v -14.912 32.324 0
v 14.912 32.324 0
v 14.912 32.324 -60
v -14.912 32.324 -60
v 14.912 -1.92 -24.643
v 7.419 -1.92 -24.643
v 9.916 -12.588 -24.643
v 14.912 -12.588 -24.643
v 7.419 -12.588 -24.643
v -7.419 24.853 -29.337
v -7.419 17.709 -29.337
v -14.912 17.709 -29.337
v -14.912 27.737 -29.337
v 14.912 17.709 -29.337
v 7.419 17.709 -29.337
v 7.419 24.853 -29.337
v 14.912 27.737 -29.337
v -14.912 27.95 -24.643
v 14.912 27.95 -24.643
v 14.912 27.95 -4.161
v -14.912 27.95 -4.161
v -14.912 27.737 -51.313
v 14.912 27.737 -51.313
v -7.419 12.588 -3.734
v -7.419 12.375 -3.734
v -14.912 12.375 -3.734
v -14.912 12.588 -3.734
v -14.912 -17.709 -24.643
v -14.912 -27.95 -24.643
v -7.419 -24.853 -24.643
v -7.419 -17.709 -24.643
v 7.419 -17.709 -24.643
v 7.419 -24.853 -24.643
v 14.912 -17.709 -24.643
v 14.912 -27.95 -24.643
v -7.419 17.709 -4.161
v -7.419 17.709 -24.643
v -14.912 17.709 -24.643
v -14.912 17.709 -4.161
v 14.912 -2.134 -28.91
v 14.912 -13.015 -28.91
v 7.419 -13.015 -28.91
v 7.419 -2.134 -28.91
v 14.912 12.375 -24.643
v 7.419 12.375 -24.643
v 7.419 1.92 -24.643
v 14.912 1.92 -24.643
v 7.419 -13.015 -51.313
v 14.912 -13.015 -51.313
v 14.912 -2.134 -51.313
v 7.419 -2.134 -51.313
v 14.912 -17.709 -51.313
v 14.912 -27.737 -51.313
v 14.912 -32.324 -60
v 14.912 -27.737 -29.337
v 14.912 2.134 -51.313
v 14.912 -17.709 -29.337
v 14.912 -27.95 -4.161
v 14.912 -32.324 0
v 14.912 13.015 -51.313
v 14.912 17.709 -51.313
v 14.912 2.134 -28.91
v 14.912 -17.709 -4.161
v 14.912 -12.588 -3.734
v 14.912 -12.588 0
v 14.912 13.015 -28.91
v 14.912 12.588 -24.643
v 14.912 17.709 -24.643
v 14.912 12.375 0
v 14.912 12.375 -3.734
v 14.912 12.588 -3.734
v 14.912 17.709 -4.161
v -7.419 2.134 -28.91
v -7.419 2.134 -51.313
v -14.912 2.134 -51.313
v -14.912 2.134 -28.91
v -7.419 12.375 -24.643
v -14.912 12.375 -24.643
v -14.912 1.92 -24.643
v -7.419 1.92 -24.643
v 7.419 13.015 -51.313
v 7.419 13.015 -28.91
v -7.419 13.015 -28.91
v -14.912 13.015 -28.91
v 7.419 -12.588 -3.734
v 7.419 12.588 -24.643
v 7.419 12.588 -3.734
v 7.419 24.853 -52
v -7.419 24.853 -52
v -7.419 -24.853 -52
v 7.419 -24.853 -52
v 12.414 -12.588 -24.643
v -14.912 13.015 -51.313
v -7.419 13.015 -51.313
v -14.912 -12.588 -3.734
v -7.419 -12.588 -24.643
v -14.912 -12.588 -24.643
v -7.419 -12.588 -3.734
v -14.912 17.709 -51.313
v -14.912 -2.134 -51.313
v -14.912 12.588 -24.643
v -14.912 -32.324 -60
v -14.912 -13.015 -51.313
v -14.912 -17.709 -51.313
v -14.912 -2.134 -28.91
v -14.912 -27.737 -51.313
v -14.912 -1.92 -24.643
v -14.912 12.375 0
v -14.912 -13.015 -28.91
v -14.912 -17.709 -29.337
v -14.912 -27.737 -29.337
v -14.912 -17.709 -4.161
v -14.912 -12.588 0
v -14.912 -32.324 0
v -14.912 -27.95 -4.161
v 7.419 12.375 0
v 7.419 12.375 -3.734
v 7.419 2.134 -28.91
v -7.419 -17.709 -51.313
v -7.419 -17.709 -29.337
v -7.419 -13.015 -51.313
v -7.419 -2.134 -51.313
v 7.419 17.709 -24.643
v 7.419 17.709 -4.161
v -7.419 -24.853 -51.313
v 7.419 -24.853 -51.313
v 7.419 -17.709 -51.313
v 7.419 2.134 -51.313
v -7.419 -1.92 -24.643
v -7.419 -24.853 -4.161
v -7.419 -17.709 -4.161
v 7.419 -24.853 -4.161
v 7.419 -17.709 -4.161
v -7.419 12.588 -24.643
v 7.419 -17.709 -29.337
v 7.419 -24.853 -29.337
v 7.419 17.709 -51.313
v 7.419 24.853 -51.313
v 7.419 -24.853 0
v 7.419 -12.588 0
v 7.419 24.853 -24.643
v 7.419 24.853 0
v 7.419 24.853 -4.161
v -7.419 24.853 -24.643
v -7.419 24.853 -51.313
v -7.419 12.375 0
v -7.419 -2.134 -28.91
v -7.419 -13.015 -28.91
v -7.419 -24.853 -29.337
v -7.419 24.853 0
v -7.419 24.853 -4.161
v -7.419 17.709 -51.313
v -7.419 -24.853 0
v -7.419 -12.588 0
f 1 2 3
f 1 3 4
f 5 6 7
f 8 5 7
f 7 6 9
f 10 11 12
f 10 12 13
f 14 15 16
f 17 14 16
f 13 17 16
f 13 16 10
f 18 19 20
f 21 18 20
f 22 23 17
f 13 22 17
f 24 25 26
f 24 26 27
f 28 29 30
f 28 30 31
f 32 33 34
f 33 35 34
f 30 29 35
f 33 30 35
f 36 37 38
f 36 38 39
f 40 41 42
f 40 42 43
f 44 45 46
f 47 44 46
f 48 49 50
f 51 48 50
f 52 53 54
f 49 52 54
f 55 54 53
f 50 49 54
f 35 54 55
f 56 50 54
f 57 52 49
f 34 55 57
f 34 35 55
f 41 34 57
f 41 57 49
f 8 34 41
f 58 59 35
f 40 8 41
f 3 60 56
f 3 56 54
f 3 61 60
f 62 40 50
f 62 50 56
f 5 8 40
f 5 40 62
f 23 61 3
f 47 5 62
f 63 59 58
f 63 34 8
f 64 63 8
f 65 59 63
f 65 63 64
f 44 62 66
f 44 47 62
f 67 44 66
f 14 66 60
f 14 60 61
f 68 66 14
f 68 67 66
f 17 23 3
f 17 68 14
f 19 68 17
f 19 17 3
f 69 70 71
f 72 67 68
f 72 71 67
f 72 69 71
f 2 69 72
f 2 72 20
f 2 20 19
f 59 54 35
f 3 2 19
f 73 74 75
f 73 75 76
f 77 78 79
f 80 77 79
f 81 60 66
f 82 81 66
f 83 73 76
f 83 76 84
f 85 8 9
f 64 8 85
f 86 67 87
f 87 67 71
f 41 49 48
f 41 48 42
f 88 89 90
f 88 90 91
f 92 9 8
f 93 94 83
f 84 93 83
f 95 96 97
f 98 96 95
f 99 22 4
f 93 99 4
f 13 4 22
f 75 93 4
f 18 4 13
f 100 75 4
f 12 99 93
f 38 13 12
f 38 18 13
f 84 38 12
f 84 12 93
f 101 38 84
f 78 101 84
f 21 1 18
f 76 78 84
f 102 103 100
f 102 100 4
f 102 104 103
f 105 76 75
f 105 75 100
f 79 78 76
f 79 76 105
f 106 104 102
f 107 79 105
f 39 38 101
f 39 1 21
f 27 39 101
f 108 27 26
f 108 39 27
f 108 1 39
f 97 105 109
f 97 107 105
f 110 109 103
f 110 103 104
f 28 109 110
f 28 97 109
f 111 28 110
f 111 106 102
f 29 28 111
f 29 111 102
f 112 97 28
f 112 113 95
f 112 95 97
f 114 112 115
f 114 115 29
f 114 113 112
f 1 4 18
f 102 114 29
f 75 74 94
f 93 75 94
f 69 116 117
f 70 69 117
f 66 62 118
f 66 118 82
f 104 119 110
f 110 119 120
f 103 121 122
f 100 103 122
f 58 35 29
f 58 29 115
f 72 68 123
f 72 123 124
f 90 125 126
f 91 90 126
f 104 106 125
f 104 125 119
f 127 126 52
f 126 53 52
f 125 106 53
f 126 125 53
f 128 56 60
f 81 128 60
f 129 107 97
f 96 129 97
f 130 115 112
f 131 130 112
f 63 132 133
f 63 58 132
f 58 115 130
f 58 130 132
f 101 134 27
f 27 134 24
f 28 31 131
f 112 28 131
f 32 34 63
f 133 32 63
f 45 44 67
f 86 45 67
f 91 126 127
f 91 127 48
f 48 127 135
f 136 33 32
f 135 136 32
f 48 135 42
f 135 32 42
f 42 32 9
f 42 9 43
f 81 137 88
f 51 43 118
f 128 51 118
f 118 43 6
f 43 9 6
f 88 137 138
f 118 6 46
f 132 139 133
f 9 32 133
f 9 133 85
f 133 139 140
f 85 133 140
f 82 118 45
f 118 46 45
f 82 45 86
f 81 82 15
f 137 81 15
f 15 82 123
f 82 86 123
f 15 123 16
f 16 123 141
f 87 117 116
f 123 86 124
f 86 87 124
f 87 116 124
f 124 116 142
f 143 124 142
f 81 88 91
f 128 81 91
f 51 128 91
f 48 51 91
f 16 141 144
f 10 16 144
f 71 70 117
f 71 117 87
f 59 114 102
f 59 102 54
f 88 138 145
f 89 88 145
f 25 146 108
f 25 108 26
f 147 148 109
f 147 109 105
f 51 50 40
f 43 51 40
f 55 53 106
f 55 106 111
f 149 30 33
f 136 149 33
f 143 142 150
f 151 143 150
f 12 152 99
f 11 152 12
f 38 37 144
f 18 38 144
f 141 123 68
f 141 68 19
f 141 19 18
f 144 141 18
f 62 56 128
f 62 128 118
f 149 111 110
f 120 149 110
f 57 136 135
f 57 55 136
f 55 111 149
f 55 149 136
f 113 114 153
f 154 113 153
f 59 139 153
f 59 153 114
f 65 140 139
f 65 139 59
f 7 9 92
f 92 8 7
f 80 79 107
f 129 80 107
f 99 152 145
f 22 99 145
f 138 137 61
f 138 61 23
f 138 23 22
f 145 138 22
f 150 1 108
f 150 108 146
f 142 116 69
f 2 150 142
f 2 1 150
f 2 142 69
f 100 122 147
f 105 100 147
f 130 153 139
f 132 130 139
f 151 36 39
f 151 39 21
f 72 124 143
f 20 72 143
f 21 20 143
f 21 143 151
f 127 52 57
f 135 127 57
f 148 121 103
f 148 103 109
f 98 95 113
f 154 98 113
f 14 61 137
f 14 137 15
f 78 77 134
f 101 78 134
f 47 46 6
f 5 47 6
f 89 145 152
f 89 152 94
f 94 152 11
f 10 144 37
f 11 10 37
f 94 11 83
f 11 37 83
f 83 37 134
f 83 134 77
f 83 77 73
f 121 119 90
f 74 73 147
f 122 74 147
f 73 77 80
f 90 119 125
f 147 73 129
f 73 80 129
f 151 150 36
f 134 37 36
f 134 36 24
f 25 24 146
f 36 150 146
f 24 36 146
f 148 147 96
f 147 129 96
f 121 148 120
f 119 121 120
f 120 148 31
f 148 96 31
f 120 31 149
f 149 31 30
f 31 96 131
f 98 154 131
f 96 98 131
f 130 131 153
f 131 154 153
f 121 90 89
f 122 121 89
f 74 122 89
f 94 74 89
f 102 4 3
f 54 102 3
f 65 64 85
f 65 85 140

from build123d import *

# Parameters (mm, degrees)
F2_DEPTH = 60
F3_DEPTH = 52
F4_W     = 10.2412812412
F4_H     = 20.4825601541
F4_W_2   = 10.6680002064
F4_H_2   = 20.9092802834
F4_W_3   = 10.0279208273
F4_H_3   = 21.9760797918
F4_W_4   = 10.8813615516
F4_H_4   = 22.402798757
F5_DEPTH = 29.8242783788
F6_W     = 10.4546393268
F6_H     = 20.9092812147
F7_DEPTH = 29.8242783788


# Not quite as in the source:
# - ends of sketch curves that miss each other by under 0.0002 mm in the source are joined


with BuildPart() as f2:
    # F0 (on Top) → F2 (new body)
    with BuildSketch(Plane.XY):
        Polygon((-14.9116391894, 32.3240421712), (-14.9116391894, 24.8527319824), (-14.9116391894, -24.8527319824), (-14.9116391894, -32.3240421712), (14.9116391894, -32.3240421712), (14.9116391894, -24.8527319824), (14.9116391894, 24.8527319824), (14.9116391894, 32.3240421712), align=None)
        Polygon((-7.4186391894, 24.8527319824), (-0.0743608106, 24.8527319824), (0.0743608106, 24.8527319824), (7.4186391894, 24.8527319824), (7.4186391894, 0), (7.4186391894, -24.8527319824), (-7.4186391894, -24.8527319824), (-7.4186391894, 0), align=None, mode=Mode.SUBTRACT)
        Polygon((0.0743608106, 24.8527319824), (-0.0743608106, 24.8527319824), (-7.4186391894, 24.8527319824), (-7.4186391894, 0), (-7.4186391894, -24.8527319824), (7.4186391894, -24.8527319824), (7.4186391894, 0), (7.4186391894, 24.8527319824), align=None)
    extrude(amount=-F2_DEPTH)

    # F1 (on face) → F3 (cut)
    with BuildSketch(Plane.XY):
        Polygon((7.4186391894, 24.8527319824), (0.0743608106, 24.8527319824), (-0.0743608106, 24.8527319824), (-7.4186391894, 24.8527319824), (-7.4186391894, 0), (-7.4186391894, -24.8527319824), (7.4186391894, -24.8527319824), (7.4186391894, 0), align=None)
    extrude(amount=-F3_DEPTH, mode=Mode.SUBTRACT)

    # F4 (on face) → F5 (cut, through all)
    with BuildSketch(Plane.YZ.offset(14.9116391894)):
        with Locations((-22.8295195848, -14.401800232)):
            Rectangle(F4_W, F4_H)
        with Locations((-7.2542401031, -14.1884401673)):
            Rectangle(F4_W_2, F4_H_2)
        with Locations((7.2542401031, -14.1884401673)):
            Rectangle(F4_W_2, F4_H_2)
        with Locations((22.8295195848, -14.401800232)):
            Rectangle(F4_W, F4_H)
        with Locations((22.7228393778, -40.3250399977)):
            Rectangle(F4_W_3, F4_H_3)
        with Locations((7.5742793269, -40.1116805151)):
            Rectangle(F4_W_4, F4_H_4)
        with Locations((-7.5742793269, -40.1116805151)):
            Rectangle(F4_W_4, F4_H_4)
        with Locations((-22.7228393778, -40.3250399977)):
            Rectangle(F4_W_3, F4_H_3)
    extrude(amount=-F5_DEPTH, mode=Mode.SUBTRACT)

    # F6 (on face) → F7 (cut, through all)
    with BuildSketch(Plane(origin=(-14.9116391894, 0, 0), x_dir=(0, -1, 0), z_dir=(-1, 0, 0))):
        Polygon((12.5882383436, 0), (-12.3748793267, 0), (-12.3748793267, -3.7338000257), (-1.9202399999, -3.7338000257), (-1.9202399999, -24.643080309), (1.9202399999, -24.6430812404), (1.9202399999, -3.7338000257), (12.5882402062, -3.7338000257), align=None)
        with Locations((-7.1475596633, -14.188440633)):
            Rectangle(F6_W, F6_H)
        Polygon((12.5882383436, -24.6430812404), (12.5882383436, -3.7338000257), (1.9202399999, -3.7338000257), (1.9202399999, -24.643080309), align=None)
    extrude(amount=-F7_DEPTH, mode=Mode.SUBTRACT)


solid = f2.part
